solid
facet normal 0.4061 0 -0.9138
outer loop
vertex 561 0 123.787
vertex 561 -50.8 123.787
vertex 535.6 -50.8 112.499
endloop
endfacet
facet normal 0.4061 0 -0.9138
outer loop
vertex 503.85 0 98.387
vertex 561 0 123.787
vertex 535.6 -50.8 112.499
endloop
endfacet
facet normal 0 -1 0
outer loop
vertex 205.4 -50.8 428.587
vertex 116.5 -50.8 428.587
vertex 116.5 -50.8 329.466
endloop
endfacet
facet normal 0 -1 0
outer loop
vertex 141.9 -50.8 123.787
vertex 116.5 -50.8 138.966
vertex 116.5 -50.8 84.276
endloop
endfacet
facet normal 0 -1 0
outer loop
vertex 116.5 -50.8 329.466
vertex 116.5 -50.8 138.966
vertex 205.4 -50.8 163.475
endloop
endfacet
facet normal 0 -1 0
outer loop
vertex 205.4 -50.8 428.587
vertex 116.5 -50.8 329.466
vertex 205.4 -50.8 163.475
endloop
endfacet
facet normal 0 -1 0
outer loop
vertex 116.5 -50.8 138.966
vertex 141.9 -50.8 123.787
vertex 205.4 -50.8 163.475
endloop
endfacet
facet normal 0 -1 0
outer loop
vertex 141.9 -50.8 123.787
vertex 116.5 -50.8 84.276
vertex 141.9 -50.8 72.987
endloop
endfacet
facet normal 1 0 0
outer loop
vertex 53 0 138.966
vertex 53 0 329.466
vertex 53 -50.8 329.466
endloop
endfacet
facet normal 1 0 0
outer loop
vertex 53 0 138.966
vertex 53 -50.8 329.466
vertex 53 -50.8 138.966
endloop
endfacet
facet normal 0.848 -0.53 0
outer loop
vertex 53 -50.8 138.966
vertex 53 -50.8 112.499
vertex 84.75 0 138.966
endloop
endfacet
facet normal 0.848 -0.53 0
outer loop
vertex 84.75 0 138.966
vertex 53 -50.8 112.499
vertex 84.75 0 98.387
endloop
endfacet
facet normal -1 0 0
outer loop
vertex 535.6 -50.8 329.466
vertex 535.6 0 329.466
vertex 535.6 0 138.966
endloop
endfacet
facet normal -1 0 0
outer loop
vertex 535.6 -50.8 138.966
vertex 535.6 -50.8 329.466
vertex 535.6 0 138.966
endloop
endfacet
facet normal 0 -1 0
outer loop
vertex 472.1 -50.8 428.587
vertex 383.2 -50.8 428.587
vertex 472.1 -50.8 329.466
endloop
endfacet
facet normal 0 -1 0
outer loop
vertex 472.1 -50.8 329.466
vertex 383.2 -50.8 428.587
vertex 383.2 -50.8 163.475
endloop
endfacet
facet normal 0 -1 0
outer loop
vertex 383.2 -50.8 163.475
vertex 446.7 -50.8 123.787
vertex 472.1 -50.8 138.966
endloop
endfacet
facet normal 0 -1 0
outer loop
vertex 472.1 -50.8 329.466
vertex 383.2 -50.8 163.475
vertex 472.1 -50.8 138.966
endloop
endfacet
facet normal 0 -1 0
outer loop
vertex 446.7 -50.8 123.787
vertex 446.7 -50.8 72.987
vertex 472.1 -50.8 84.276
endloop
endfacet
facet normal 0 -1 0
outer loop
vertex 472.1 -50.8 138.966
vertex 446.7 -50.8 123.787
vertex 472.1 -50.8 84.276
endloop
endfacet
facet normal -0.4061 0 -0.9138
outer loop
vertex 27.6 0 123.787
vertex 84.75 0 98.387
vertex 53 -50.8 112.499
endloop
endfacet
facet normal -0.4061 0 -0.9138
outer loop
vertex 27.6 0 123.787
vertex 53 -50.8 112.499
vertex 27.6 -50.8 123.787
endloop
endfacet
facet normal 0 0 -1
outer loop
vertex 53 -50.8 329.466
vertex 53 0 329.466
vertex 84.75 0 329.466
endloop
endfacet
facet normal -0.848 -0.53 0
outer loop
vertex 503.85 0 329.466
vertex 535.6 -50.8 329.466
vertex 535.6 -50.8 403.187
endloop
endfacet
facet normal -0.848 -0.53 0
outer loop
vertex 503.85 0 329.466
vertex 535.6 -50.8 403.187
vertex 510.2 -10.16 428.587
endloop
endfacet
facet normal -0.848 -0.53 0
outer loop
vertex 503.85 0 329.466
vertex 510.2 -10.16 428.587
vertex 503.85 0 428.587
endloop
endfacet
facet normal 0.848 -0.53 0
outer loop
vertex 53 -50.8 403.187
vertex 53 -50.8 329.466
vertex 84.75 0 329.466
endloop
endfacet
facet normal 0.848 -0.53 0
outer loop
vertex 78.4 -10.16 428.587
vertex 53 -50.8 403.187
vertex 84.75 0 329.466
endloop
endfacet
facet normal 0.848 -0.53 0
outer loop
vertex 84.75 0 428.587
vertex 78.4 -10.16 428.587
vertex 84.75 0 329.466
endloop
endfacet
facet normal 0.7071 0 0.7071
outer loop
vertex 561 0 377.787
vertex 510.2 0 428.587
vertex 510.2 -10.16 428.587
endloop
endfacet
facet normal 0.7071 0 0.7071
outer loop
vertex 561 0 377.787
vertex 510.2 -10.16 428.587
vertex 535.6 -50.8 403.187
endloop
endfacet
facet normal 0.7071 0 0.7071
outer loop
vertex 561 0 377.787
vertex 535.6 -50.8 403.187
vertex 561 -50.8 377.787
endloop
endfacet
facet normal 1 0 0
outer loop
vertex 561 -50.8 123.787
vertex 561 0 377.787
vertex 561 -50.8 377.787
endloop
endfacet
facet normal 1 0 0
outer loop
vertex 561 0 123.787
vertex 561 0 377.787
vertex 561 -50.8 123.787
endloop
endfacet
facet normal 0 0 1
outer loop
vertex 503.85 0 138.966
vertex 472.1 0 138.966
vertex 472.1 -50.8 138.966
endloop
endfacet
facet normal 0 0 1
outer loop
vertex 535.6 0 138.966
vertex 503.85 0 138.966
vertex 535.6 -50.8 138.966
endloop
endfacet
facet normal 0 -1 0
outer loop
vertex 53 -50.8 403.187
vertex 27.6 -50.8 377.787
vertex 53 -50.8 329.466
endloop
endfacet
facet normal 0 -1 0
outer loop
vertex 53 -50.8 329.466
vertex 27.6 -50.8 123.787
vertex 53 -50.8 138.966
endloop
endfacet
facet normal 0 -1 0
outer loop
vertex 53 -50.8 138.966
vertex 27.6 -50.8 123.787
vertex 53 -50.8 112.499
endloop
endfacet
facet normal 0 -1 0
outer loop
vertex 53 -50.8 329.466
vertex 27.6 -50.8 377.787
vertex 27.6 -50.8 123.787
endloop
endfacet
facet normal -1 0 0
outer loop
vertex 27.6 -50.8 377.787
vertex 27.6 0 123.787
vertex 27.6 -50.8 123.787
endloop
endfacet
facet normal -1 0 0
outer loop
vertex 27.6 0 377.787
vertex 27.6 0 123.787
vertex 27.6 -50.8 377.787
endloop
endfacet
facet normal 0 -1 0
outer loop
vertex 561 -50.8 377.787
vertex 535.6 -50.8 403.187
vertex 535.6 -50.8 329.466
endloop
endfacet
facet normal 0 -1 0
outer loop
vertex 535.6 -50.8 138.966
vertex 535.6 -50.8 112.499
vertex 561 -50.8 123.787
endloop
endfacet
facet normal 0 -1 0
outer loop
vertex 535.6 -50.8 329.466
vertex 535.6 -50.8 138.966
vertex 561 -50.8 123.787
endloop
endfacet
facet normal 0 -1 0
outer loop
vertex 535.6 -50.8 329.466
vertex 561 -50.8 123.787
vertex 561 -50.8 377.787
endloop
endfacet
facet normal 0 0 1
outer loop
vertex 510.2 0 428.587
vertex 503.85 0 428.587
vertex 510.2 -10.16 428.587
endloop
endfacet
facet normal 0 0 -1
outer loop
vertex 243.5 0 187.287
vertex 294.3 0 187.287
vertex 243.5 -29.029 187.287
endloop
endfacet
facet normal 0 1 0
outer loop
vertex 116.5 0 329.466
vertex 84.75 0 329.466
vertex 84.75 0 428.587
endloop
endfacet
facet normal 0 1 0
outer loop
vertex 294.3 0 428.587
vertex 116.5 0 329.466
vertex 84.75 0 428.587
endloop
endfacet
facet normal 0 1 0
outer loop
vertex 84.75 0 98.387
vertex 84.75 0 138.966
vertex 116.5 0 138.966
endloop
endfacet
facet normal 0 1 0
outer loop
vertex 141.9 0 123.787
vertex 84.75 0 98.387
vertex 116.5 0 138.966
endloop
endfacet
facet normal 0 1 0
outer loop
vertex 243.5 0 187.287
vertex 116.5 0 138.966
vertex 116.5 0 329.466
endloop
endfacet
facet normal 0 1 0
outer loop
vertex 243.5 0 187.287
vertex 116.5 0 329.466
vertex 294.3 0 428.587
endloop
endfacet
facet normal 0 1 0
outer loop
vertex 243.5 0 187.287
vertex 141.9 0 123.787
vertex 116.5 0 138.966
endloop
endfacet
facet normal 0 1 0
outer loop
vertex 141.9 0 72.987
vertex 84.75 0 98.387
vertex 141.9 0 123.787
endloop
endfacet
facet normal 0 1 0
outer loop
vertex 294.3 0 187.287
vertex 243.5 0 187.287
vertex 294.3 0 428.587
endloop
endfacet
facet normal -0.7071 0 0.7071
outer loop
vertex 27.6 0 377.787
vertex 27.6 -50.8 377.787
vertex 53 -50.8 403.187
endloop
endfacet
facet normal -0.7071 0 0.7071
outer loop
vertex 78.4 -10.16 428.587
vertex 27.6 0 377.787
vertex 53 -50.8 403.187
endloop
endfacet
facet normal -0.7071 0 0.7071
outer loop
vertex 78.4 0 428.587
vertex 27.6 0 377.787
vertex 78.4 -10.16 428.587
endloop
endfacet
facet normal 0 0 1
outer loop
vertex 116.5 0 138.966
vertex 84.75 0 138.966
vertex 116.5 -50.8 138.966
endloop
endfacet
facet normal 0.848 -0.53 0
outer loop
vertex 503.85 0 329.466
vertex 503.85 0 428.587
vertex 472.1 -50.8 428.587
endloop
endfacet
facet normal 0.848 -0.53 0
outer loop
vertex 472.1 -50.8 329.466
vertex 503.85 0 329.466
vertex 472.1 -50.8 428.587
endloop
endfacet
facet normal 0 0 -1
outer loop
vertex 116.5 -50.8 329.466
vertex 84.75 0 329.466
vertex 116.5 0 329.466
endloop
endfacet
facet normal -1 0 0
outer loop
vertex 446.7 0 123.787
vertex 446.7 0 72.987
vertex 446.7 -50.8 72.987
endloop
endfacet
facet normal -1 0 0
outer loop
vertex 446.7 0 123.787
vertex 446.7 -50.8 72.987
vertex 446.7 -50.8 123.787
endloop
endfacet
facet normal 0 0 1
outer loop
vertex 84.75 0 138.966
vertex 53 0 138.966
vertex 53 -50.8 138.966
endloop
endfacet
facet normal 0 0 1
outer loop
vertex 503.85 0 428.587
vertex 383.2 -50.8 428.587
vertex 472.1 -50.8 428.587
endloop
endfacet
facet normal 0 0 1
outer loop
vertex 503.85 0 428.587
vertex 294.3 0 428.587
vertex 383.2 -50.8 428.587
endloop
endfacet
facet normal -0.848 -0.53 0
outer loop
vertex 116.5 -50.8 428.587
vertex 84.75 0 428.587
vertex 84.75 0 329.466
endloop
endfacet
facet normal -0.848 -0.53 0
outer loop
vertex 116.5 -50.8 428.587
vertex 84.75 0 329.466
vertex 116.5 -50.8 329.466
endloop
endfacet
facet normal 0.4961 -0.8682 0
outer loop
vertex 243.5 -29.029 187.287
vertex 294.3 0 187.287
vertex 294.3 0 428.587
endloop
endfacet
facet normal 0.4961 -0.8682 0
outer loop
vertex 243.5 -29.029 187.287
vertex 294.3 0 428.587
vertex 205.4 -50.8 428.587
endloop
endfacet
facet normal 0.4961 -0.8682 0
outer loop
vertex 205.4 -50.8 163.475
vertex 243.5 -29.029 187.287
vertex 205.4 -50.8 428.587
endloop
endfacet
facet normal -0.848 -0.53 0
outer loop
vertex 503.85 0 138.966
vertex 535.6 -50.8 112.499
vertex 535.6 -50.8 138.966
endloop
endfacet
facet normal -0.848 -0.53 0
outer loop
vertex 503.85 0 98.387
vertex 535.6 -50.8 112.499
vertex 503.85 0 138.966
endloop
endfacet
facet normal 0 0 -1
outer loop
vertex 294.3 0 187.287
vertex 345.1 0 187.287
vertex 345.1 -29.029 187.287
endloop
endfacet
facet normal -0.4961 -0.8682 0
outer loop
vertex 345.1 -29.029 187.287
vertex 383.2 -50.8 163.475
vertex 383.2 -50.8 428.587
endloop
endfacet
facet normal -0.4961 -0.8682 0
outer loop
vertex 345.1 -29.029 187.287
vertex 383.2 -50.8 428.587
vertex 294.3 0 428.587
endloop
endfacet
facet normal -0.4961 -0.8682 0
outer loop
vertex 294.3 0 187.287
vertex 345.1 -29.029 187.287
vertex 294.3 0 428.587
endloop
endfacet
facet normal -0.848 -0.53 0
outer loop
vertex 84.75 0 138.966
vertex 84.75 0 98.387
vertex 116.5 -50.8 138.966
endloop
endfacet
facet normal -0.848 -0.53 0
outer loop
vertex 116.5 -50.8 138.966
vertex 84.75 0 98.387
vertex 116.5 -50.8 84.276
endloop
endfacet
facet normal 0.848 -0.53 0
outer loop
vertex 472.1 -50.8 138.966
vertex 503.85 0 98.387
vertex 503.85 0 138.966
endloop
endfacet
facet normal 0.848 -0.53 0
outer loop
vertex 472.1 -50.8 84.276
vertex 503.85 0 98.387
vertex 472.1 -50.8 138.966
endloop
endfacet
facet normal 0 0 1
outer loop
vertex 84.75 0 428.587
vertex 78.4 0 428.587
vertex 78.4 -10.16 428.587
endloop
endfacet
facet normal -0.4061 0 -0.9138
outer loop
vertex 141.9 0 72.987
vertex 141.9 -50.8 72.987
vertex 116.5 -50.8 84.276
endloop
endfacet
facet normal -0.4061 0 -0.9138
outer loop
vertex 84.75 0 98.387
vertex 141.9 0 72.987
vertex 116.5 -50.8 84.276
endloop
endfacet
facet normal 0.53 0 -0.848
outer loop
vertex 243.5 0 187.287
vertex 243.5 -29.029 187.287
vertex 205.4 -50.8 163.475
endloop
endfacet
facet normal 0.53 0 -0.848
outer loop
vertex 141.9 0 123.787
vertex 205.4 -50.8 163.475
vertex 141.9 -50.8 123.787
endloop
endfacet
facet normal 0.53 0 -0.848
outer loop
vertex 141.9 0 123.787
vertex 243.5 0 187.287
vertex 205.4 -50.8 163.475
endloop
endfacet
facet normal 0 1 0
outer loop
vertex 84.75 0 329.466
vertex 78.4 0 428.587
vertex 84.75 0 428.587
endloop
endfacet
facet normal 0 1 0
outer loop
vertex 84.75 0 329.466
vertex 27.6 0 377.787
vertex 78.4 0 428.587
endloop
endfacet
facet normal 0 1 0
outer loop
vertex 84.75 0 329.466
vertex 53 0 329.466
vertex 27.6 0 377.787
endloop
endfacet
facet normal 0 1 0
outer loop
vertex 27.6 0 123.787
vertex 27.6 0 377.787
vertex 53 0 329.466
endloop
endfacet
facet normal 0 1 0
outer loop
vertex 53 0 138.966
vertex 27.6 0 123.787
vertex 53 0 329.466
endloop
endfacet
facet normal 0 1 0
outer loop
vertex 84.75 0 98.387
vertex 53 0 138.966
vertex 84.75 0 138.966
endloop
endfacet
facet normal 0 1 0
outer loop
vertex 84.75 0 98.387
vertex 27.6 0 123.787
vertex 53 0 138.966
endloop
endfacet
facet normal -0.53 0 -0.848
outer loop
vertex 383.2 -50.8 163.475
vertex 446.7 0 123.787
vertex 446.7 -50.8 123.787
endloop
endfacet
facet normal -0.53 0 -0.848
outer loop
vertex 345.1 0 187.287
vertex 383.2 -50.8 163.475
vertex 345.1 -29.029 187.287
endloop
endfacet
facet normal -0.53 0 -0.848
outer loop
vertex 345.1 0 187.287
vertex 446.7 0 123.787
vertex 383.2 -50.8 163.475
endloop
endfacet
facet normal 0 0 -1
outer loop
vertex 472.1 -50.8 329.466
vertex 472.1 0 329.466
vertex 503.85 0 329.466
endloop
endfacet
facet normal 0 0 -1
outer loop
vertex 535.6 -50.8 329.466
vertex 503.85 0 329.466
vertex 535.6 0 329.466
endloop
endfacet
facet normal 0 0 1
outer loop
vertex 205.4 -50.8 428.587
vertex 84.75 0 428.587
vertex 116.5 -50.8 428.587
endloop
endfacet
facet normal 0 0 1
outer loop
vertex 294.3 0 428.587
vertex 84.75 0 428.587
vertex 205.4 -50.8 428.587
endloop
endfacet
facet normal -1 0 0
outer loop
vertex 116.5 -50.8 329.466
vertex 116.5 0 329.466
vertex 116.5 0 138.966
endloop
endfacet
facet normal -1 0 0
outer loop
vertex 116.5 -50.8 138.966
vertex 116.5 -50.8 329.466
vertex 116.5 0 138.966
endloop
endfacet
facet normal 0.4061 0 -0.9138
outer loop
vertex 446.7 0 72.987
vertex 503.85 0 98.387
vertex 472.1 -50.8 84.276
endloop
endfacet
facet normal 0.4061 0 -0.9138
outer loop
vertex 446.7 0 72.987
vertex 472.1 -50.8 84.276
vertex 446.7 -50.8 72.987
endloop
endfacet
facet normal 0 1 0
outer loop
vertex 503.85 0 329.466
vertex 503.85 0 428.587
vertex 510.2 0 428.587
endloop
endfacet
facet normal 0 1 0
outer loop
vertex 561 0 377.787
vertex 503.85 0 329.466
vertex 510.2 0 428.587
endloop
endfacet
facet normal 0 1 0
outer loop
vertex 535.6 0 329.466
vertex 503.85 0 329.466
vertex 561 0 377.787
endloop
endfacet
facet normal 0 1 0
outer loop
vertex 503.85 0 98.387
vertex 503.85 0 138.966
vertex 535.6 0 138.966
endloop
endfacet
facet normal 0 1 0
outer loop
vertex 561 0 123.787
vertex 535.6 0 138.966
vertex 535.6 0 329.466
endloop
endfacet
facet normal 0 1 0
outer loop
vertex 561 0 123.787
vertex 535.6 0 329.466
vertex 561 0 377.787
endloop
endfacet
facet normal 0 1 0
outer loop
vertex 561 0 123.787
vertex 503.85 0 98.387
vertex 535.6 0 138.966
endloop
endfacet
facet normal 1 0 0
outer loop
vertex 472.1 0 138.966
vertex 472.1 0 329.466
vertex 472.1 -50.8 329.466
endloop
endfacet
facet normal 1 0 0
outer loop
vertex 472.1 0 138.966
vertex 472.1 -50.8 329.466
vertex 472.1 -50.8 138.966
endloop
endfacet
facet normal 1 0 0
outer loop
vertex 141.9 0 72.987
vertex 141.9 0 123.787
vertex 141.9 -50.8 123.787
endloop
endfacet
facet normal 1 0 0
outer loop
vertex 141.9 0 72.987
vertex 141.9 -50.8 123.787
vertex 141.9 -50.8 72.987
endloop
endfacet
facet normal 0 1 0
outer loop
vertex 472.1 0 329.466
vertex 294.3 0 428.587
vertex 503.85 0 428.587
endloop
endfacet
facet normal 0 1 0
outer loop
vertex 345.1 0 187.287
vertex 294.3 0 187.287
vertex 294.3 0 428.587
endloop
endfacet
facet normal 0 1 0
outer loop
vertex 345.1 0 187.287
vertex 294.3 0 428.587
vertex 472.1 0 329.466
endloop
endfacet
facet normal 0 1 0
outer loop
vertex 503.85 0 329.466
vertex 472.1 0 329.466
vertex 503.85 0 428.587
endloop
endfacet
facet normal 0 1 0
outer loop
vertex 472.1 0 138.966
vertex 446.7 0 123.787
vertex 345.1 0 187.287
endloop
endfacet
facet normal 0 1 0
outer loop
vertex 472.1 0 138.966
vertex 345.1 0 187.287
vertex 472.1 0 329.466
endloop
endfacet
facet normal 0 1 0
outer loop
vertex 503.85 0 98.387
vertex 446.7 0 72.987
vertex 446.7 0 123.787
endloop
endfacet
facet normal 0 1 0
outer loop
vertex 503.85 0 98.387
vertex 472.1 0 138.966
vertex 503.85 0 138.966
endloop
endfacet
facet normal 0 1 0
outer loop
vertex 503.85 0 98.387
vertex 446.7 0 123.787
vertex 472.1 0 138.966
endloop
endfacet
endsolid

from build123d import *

# Parameters (mm, degrees)
SKETCH1_W           = 63.5
SKETCH1_H           = 190.5
BOSS_EXTRUDE1_DEPTH = 50.8
CUT_EXTRUDE1_DEPTH  = 708.805574494


with BuildPart() as part:
    # Sketch1 → Boss-Extrude1 (new body)
    with BuildSketch(Plane(origin=(0, 0, 0), x_dir=(1, 0, 0), z_dir=(0, 1, 0))):
        Polygon((446.699903074, -123.787447361), (345.099903074, -187.287447361), (243.499903074, -187.287447361), (141.899903074, -123.787447361), (141.899903074, -72.987447361), (27.599903074, -123.787447361), (27.599903074, -123.848308515), (27.599903074, -375.907017994), (27.599903074, -377.787447361), (78.399903074, -428.587447361), (510.199903074, -428.587447361), (560.999903074, -377.787447361), (560.999903074, -123.787447361), (446.699903074, -72.987447361), align=None)
        with Locations((84.749903074, -234.21600548)):
            Rectangle(SKETCH1_W, SKETCH1_H, mode=Mode.SUBTRACT)
        with Locations((503.849903074, -234.21600548)):
            Rectangle(SKETCH1_W, SKETCH1_H, mode=Mode.SUBTRACT)
    extrude(amount=-BOSS_EXTRUDE1_DEPTH)

    # Sketch2 → Cut-Extrude1 (cut, through all)
    with BuildSketch(Plane.XY):
        Polygon((52.999903074, -50.8), (84.749903074, 0), (116.499903074, -50.8), align=None)
        Polygon((294.299903074, 0), (205.399903074, -50.8), (383.199903074, -50.8), align=None)
        Polygon((472.099903074, -50.8), (535.599903074, -50.8), (503.849903074, 0), align=None)
    extrude(amount=CUT_EXTRUDE1_DEPTH, mode=Mode.SUBTRACT)


with BuildPart() as cut_extrude1_piece_1:
    # of the separate pieces the step leaves, piece 1, a body of its own (cut_extrude1_pieces)
    add(part.part.solids().sort_by_distance((116.499903074, 0, 329.46600548))[0])


with BuildPart() as cut_extrude1_piece_2:
    # of the separate pieces the step leaves, piece 2, a body of its own (cut_extrude1_pieces)
    add(part.part.solids().sort_by_distance((446.699903074, 0, 123.787447361))[0])


with BuildPart() as cut_extrude1_piece_3:
    # of the separate pieces the step leaves, piece 3, a body of its own (cut_extrude1_pieces)
    add(part.part.solids().sort_by_distance((560.999903074, 0, 123.787447361))[0])


with BuildPart() as cut_extrude1_piece_4:
    # of the separate pieces the step leaves, piece 4, a body of its own (cut_extrude1_pieces)
    add(part.part.solids().sort_by_distance((78.399903074, 0, 428.587447361))[0])


solid = Compound([cut_extrude1_piece_1.part, cut_extrude1_piece_2.part, cut_extrude1_piece_3.part, cut_extrude1_piece_4.part])
